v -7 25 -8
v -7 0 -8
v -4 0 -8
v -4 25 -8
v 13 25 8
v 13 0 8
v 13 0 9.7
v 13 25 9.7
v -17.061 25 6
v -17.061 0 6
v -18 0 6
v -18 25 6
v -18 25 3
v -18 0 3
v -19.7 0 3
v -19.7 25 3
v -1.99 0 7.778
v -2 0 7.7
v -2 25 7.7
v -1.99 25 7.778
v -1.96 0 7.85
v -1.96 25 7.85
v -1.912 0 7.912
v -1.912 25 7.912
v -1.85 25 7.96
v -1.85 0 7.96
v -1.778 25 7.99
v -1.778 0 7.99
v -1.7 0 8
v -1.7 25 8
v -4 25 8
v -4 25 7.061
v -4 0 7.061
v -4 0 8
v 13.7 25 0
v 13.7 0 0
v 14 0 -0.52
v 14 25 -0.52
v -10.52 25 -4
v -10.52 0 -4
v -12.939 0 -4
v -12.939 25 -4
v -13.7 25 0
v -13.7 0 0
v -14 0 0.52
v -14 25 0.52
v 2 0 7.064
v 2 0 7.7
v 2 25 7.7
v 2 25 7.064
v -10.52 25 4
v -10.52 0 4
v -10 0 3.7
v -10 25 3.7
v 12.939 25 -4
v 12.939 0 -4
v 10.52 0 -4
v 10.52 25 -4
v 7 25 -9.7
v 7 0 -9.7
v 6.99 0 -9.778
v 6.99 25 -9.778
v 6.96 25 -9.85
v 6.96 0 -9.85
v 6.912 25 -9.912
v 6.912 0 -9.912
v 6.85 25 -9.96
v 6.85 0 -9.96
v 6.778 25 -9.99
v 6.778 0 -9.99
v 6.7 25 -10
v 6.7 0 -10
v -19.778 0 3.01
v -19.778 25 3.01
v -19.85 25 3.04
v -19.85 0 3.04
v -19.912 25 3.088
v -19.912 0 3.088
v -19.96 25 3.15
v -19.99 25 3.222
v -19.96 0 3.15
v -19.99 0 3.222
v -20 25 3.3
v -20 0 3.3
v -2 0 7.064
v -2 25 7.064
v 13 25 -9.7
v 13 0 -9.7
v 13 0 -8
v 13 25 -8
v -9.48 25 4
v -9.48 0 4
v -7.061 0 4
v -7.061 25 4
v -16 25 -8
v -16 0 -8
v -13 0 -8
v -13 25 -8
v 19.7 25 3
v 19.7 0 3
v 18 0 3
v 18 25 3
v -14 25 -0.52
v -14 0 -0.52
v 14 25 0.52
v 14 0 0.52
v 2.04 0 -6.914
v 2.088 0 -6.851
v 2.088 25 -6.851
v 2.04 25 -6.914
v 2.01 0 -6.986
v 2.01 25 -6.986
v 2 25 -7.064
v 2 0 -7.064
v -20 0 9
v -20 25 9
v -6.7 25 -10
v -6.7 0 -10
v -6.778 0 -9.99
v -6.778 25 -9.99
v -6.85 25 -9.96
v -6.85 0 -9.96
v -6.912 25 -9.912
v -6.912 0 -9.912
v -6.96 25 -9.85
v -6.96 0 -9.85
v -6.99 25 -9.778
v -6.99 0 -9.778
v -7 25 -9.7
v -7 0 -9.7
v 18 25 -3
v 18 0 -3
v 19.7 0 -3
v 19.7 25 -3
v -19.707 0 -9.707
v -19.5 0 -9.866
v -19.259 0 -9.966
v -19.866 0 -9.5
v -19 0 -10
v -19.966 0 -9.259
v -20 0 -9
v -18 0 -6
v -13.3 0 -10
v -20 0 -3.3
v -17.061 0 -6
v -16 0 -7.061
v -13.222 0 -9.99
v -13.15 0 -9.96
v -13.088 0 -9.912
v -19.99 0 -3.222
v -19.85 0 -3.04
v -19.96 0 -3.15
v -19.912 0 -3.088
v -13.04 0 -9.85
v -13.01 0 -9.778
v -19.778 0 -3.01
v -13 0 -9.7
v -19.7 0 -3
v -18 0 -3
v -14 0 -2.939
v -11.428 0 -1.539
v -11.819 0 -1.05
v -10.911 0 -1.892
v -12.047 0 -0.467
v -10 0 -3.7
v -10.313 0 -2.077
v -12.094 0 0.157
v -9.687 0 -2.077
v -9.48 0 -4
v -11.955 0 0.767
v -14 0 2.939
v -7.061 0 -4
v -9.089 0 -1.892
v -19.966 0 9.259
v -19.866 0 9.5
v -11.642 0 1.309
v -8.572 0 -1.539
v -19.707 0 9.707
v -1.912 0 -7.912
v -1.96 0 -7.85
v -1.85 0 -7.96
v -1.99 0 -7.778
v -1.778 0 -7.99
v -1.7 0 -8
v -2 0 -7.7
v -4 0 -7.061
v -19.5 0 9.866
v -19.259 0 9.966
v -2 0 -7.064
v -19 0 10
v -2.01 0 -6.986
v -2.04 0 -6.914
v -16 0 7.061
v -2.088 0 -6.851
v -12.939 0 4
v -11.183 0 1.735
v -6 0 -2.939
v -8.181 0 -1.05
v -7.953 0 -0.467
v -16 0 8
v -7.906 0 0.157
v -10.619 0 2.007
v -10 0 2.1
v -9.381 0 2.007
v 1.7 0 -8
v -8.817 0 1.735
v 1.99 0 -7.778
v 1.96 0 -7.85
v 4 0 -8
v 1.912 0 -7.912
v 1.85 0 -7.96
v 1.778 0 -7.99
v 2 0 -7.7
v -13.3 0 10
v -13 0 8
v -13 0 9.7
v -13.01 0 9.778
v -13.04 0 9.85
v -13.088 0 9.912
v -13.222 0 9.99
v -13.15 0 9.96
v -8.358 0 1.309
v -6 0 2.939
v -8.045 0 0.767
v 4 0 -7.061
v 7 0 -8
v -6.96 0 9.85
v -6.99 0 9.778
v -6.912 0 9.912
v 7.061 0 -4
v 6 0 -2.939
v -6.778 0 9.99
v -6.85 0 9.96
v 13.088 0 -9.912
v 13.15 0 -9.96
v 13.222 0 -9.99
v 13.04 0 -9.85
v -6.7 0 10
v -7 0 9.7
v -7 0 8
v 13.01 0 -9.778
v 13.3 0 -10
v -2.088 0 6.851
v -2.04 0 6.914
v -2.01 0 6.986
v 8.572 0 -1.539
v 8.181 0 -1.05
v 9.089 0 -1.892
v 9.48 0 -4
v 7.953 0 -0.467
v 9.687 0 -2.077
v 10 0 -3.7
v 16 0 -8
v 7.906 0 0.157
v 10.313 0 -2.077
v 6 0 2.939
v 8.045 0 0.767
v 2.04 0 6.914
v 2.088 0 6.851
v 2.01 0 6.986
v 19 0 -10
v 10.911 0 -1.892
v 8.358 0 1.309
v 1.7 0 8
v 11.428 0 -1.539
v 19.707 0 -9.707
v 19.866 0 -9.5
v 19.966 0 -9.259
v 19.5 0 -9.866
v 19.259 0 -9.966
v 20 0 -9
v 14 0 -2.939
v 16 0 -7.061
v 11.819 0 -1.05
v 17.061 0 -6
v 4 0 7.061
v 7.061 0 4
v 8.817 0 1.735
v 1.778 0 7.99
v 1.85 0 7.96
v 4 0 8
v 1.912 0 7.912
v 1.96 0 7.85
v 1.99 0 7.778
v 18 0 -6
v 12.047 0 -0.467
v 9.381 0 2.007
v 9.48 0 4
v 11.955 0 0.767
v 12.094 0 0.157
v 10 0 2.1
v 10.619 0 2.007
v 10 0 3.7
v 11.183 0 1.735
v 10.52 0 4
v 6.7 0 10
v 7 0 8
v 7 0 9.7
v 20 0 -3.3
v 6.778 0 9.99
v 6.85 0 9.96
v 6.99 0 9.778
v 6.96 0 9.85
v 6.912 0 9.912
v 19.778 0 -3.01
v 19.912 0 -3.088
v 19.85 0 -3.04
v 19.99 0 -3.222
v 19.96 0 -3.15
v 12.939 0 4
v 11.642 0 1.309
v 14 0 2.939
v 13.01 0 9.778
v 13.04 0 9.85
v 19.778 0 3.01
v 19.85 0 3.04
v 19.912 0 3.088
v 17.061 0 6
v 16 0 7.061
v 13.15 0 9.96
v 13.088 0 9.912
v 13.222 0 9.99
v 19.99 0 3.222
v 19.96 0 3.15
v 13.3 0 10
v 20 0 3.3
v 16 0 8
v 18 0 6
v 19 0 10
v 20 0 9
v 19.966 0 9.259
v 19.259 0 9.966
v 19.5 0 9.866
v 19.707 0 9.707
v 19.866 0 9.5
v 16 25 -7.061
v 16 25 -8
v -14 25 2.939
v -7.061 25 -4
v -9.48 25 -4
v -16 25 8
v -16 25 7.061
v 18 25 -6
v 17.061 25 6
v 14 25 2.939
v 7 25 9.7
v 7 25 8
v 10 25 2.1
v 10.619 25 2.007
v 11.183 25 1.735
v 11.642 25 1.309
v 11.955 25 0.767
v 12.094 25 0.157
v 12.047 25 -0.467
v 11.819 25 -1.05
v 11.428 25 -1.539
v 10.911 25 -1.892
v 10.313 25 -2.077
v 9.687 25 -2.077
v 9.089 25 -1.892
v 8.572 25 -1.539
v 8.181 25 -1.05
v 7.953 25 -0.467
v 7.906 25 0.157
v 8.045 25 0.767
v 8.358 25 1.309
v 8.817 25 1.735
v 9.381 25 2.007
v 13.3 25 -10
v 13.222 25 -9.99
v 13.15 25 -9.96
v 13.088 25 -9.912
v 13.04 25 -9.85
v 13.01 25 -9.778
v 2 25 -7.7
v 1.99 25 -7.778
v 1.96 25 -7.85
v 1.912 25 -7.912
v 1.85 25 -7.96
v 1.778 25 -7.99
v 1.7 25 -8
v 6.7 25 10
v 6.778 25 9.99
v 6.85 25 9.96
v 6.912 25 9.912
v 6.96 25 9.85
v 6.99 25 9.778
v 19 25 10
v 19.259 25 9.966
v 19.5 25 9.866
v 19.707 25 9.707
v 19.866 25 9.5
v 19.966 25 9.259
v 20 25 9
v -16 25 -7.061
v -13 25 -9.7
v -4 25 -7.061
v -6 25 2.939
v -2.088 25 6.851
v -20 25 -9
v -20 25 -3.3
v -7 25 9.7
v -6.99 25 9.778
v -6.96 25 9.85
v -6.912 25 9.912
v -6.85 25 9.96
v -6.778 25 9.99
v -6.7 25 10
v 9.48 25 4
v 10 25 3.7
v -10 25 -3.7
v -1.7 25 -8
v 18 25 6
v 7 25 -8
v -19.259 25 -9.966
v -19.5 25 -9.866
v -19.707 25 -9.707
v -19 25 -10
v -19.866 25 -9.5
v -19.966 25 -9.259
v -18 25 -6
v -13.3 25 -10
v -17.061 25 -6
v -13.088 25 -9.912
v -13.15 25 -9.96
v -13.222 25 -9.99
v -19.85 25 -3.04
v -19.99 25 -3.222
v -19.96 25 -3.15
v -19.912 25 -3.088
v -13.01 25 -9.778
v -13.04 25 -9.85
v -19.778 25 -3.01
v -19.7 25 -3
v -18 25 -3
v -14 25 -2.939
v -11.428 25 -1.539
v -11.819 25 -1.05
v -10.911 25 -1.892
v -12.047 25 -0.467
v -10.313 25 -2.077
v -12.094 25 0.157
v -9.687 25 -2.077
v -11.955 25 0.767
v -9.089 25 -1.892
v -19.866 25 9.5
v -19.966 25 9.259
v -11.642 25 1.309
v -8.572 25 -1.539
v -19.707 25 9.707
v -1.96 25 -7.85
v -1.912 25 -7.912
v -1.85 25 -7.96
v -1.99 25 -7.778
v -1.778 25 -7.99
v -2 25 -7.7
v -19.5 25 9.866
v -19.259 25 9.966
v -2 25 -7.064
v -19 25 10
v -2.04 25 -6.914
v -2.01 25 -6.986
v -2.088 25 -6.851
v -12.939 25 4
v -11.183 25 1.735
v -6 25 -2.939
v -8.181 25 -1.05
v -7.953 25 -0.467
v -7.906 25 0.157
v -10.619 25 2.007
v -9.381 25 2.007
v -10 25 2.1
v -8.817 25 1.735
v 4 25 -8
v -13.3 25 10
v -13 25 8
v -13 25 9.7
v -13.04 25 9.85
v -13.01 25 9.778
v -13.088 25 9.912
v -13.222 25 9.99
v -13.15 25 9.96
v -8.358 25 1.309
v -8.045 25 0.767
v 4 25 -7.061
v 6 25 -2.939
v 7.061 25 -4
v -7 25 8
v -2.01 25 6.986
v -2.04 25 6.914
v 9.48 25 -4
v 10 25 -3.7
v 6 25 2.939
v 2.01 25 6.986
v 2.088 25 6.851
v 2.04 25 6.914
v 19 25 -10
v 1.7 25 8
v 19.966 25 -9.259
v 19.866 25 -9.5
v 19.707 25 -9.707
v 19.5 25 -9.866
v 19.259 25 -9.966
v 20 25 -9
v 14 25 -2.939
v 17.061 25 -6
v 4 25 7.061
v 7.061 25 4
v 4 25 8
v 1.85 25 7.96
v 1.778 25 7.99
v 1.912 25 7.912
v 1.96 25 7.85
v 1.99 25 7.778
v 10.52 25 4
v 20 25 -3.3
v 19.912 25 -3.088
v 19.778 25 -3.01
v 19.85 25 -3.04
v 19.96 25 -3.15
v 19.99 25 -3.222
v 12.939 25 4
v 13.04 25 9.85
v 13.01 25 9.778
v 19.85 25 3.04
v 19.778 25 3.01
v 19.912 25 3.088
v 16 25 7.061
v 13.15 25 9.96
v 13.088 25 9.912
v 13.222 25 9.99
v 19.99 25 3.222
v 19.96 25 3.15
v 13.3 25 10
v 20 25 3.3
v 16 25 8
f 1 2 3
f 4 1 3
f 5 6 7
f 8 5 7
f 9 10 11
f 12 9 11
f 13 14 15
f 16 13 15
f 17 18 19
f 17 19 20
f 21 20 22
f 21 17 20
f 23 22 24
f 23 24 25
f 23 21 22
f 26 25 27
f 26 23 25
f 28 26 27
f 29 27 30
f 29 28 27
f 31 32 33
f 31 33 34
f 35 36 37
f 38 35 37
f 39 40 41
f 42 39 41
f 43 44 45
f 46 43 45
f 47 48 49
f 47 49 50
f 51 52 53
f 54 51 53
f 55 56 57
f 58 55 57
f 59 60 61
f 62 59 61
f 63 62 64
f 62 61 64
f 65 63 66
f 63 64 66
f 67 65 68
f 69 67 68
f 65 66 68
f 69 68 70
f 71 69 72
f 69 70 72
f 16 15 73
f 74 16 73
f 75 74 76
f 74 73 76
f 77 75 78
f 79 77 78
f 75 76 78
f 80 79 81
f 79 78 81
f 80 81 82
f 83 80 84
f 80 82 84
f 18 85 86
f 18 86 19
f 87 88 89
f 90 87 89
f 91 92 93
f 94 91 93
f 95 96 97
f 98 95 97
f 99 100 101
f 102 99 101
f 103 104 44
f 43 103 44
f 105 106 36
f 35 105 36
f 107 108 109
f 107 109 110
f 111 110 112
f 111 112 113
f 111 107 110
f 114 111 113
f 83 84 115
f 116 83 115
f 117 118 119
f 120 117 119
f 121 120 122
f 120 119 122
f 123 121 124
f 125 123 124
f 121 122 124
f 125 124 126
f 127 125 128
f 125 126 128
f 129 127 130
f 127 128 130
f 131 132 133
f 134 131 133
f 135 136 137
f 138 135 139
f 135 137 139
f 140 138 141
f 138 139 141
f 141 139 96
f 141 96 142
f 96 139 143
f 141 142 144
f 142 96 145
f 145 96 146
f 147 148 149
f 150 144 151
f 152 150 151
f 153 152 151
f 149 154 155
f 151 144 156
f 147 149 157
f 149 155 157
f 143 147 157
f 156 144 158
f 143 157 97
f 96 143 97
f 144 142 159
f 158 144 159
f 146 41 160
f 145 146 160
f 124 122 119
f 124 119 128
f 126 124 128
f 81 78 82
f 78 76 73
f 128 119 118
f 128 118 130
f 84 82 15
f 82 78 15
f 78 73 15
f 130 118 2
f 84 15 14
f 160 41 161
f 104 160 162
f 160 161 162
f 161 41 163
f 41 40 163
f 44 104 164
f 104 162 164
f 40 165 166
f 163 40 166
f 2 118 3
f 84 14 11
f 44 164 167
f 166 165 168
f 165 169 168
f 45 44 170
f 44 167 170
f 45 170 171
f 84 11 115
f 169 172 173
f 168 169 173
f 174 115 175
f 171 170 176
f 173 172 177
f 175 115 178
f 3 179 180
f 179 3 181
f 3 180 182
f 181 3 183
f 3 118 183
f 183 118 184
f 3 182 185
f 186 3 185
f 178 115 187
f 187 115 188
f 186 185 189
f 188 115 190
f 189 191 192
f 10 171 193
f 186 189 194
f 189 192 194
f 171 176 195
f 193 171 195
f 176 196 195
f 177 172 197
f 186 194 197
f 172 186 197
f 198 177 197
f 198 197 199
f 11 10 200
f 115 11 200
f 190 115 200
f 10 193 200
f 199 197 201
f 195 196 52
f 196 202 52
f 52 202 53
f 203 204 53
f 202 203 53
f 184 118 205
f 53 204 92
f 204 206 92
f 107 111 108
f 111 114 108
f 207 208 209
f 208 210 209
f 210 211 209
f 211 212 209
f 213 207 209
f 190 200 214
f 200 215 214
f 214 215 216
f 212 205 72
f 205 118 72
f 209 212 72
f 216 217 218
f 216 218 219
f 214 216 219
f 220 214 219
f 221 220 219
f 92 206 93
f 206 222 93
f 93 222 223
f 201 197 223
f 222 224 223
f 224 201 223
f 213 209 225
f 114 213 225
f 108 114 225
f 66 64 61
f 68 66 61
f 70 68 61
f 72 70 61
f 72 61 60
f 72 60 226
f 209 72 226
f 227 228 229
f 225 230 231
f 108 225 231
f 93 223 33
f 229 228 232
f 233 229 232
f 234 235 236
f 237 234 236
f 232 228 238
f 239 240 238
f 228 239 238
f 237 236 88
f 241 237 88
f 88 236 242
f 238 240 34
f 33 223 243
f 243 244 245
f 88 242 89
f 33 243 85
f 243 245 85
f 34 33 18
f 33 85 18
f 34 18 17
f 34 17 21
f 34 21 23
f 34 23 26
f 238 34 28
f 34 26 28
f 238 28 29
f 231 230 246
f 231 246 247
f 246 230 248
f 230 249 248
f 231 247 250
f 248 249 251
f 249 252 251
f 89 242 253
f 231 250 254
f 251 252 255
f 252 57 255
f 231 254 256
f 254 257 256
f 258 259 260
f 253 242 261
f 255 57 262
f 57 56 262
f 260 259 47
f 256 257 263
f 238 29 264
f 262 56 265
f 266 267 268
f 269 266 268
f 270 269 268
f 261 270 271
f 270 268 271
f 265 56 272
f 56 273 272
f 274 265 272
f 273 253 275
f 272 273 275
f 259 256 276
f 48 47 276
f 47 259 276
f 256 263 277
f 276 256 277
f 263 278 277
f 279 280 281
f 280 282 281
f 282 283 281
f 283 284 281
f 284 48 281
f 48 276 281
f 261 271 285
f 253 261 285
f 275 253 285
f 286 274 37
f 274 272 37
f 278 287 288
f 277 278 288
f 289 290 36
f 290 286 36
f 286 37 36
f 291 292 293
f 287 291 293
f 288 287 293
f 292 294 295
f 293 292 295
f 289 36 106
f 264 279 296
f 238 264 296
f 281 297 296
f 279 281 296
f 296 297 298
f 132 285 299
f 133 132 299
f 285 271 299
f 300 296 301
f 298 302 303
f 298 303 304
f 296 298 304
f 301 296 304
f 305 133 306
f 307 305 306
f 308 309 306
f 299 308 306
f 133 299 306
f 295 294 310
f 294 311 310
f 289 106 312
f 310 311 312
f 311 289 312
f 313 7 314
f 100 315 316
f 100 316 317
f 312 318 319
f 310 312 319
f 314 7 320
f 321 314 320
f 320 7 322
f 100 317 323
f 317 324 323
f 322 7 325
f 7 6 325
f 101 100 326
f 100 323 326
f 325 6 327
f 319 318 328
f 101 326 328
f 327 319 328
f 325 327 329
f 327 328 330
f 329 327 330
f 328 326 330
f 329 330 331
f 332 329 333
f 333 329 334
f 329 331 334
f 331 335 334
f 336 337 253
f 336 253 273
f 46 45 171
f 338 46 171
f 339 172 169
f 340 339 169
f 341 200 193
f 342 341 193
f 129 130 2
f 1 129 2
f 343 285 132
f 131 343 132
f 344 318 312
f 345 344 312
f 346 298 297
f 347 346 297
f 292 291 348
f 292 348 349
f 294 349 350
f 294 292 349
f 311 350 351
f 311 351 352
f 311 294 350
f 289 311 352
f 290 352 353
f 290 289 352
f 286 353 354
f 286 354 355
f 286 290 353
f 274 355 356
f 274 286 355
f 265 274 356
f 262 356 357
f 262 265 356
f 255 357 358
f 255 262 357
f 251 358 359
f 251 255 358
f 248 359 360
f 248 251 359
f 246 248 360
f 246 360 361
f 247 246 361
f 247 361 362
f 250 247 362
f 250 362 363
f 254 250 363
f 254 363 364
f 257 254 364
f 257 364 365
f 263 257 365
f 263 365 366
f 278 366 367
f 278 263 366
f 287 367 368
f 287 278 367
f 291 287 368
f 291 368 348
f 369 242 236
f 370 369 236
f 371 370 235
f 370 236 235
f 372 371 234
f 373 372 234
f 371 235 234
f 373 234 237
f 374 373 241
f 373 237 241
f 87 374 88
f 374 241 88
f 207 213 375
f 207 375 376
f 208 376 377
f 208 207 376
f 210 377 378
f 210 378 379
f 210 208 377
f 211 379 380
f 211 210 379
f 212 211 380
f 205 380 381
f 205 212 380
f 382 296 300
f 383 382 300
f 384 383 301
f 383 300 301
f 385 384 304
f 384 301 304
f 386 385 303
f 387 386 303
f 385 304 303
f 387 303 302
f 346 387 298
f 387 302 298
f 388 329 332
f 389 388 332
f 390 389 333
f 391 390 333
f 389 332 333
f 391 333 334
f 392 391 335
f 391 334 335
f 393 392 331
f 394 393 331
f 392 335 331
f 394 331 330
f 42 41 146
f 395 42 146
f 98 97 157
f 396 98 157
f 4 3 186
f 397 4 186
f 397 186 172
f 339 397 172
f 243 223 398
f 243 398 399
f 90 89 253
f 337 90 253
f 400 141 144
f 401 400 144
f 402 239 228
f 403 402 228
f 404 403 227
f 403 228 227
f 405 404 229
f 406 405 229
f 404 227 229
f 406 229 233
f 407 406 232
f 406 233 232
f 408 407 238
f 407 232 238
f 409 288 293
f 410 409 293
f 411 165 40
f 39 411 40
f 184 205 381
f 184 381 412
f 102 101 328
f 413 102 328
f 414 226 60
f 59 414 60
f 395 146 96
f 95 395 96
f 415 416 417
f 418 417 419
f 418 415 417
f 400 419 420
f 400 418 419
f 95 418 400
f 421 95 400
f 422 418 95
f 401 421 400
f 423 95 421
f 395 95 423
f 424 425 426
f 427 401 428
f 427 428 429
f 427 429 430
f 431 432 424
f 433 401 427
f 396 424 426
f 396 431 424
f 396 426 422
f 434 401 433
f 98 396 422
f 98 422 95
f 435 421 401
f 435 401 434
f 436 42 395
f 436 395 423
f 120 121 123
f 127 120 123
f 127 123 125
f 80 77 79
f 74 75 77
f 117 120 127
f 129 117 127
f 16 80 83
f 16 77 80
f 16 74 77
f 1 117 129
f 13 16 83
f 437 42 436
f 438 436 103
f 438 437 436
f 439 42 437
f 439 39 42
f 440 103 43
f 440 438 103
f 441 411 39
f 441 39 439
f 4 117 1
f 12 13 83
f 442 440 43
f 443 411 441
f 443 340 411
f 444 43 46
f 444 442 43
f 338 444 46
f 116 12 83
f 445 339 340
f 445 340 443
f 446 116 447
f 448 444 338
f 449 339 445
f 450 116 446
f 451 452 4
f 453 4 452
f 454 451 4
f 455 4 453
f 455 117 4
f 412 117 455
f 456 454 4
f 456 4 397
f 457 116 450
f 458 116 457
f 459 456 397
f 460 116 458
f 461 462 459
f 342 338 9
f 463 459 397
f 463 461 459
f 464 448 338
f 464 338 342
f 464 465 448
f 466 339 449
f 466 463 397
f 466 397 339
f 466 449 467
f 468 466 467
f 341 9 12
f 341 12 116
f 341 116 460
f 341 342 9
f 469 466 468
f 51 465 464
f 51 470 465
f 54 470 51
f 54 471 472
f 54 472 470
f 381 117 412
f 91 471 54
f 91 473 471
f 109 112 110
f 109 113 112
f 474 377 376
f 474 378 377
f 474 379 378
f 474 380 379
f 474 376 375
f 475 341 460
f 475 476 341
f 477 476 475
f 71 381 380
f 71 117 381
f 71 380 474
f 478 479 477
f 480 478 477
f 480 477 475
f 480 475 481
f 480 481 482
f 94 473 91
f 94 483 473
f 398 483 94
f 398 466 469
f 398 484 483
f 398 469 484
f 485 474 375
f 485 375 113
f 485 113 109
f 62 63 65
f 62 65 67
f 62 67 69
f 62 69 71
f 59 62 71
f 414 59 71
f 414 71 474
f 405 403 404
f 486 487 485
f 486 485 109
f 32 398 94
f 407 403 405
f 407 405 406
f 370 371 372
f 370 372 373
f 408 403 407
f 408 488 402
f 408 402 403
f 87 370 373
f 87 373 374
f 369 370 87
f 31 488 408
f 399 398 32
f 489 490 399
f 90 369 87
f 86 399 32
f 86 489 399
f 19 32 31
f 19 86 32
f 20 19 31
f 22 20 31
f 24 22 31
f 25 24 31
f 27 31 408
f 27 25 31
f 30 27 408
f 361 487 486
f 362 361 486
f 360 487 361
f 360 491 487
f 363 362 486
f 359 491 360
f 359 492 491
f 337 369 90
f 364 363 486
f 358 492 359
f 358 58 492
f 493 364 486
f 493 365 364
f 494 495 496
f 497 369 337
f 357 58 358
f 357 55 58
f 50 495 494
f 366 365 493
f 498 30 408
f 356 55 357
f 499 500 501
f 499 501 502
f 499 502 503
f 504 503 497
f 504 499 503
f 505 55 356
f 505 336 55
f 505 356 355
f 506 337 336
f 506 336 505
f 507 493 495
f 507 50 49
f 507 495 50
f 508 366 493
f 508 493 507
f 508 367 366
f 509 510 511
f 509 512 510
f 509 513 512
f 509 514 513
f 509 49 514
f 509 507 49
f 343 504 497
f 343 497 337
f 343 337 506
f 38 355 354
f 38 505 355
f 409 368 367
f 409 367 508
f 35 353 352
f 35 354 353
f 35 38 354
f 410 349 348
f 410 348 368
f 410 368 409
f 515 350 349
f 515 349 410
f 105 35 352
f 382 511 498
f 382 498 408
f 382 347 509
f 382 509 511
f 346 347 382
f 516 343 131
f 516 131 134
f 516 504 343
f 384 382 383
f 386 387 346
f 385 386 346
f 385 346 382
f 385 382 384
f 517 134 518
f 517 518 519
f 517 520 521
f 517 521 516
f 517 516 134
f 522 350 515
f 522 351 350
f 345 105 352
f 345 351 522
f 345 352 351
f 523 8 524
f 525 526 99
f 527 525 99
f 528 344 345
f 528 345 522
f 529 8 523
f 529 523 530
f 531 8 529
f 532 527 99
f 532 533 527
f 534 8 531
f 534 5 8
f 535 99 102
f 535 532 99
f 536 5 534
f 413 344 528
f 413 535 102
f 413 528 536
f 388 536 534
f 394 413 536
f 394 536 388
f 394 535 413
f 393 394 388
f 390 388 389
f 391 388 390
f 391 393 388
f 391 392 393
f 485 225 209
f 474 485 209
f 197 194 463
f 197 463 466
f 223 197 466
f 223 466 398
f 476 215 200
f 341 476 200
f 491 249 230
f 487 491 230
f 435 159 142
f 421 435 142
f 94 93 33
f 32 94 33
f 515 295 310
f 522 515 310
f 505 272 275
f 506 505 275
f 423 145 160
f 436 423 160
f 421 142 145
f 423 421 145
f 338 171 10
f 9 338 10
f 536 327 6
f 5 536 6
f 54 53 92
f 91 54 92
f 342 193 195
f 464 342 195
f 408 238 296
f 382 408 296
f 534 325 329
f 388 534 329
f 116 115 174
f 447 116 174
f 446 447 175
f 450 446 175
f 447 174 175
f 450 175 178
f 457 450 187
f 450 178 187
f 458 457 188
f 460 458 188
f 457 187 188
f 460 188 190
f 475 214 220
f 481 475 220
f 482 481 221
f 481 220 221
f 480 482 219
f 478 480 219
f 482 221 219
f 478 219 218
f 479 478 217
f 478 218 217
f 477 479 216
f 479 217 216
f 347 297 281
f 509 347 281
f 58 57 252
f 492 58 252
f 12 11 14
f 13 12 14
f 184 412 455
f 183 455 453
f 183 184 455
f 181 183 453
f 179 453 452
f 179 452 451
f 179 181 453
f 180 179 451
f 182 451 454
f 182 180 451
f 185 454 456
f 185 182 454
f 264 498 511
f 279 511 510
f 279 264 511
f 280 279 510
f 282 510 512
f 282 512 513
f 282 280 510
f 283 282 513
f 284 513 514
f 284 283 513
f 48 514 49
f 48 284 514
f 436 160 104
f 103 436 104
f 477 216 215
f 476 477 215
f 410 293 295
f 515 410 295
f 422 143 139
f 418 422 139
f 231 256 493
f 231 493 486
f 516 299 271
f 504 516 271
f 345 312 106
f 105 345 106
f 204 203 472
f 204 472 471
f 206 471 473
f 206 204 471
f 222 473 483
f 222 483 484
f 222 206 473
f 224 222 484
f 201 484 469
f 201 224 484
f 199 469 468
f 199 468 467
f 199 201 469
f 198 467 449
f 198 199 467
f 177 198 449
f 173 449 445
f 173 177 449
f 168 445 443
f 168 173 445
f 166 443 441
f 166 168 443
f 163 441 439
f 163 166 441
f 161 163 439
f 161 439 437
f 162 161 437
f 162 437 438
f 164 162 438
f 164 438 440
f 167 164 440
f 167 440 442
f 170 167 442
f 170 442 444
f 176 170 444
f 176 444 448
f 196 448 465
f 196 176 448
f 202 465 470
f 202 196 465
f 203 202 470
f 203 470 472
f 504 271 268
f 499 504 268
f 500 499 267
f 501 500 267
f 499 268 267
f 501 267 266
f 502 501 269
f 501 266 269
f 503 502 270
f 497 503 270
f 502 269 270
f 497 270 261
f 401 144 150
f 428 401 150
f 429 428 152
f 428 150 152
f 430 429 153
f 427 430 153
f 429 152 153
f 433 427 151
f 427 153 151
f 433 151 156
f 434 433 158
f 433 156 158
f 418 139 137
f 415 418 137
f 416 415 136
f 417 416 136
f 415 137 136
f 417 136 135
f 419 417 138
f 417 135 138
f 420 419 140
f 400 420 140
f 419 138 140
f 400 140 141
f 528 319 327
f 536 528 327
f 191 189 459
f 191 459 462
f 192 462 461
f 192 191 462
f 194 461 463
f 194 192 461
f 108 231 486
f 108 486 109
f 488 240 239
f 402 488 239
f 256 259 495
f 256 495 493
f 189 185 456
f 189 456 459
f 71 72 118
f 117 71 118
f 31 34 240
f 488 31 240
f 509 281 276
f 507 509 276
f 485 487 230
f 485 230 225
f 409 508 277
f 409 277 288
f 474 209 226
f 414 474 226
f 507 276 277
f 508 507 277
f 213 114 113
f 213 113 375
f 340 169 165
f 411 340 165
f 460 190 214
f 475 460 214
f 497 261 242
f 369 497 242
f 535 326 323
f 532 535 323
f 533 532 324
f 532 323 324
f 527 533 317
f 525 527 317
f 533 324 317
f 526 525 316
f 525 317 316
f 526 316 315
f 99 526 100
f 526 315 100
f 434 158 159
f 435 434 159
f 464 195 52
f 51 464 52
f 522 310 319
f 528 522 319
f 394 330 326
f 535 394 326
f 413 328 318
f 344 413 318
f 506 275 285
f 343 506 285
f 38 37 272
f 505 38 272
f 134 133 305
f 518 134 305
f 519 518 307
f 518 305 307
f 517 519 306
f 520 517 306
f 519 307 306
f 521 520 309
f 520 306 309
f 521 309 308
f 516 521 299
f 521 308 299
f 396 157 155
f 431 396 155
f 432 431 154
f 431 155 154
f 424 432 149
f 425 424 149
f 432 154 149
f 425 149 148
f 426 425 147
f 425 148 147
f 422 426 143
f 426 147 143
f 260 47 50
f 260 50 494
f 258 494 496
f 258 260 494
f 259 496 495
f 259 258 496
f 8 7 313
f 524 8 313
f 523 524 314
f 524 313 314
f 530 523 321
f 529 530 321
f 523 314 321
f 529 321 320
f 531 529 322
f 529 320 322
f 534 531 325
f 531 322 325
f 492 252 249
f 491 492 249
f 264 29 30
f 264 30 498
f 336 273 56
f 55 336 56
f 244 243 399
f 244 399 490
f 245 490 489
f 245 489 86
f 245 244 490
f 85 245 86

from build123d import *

# Parameters (mm, degrees)
MODEL_R                  = 2.0999999
STRUCTURAL_MEMBER1_DEPTH = 25


with BuildPart() as part:
    # Model → Structural Member1 (new body)
    with BuildSketch(Plane.ZX):
        with BuildLine():
            Line((-10, -13.3000005), (-10, -19))
            ThreePointArc((-10, -19), (-9.707106781, -19.707106781), (-9, -20))
            Line((-9, -20), (-3.3, -20))
            ThreePointArc((-3.3, -20), (-3.087867966, -19.912132034), (-3, -19.7))
            Line((-3, -19.7), (-3, -18))
            Line((-3, -18), (-6, -18))
            Line((-6, -18), (-6, -17.0606825))
            Line((-6, -17.0606825), (-2.939318, -14))
            Line((-2.939318, -14), (-0.519615242, -14))
            Line((-0.519615242, -14), (0, -13.7))
            Line((0, -13.7), (0.519615242, -14))
            Line((0.519615242, -14), (2.9393365, -14))
            Line((2.9393365, -14), (6, -17.0606628))
            Line((6, -17.0606628), (6, -18))
            Line((6, -18), (3, -18))
            Line((3, -18), (3, -19.7))
            ThreePointArc((3, -19.7), (3.087867966, -19.912132034), (3.3, -20))
            Line((3.3, -20), (9, -20))
            ThreePointArc((9, -20), (9.707106781, -19.707106781), (10, -19))
            Line((10, -19), (10, -13.3000005))
            ThreePointArc((10, -13.3000005), (9.912132034, -13.087868466), (9.7, -13.0000005))
            Line((9.7, -13.0000005), (8, -13.0000005))
            Line((8, -13.0000005), (8, -16.0000005))
            Line((8, -16.0000005), (7.06065685, -16.0000005))
            Line((7.06065685, -16.0000005), (4, -12.93934215))
            Line((4, -12.93934215), (4, -10.519615742))
            Line((4, -10.519615742), (3.7, -10.0000005))
            Line((3.7, -10.0000005), (4, -9.480385258))
            Line((4, -9.480385258), (4, -7.06068365))
            Line((4, -7.06068365), (7.06068236, -4.000000504))
            Line((7.06068236, -4.000000504), (8, -4.000000504))
            Line((8, -4.000000504), (8, -7.0000005))
            Line((8, -7.0000005), (9.7, -7.0000005))
            ThreePointArc((9.7, -7.0000005), (9.912132034, -6.912132534), (10, -6.7000005))
            Line((10, -6.7000005), (10, 6.7))
            ThreePointArc((10, 6.7), (9.912132034, 6.912132034), (9.7, 7))
            Line((9.7, 7), (8, 7))
            Line((8, 7), (8, 4))
            Line((8, 4), (7.060678, 4))
            Line((7.060678, 4), (4, 7.06068075))
            Line((4, 7.06068075), (4, 9.480384758))
            Line((4, 9.480384758), (3.7, 10))
            Line((3.7, 10), (4, 10.519615242))
            Line((4, 10.519615242), (4, 12.93933675))
            Line((4, 12.93933675), (7.060661, 16))
            Line((7.060661, 16), (8, 16))
            Line((8, 16), (8, 13))
            Line((8, 13), (9.7, 13))
            ThreePointArc((9.7, 13), (9.912132034, 13.087867966), (10, 13.3))
            Line((10, 13.3), (10, 19))
            ThreePointArc((10, 19), (9.707106781, 19.707106781), (9, 20))
            Line((9, 20), (3.3, 20))
            ThreePointArc((3.3, 20), (3.087867966, 19.912132034), (3, 19.7))
            Line((3, 19.7), (3, 18))
            Line((3, 18), (6, 18))
            Line((6, 18), (6, 17.06065975))
            Line((6, 17.06065975), (2.939354, 14))
            Line((2.939354, 14), (0.519638625, 14))
            Line((0.519638625, 14), (0, 13.6999865))
            Line((0, 13.6999865), (-0.519638625, 14))
            Line((-0.519638625, 14), (-2.939335, 14))
            Line((-2.939335, 14), (-6, 17.060678))
            Line((-6, 17.060678), (-6, 18))
            Line((-6, 18), (-3, 18))
            Line((-3, 18), (-3, 19.7))
            ThreePointArc((-3, 19.7), (-3.087867966, 19.912132034), (-3.3, 20))
            Line((-3.3, 20), (-9, 20))
            ThreePointArc((-9, 20), (-9.707106781, 19.707106781), (-10, 19))
            Line((-10, 19), (-10, 13.3))
            ThreePointArc((-10, 13.3), (-9.912132034, 13.087867966), (-9.7, 13))
            Line((-9.7, 13), (-8, 13))
            Line((-8, 13), (-8, 16))
            Line((-8, 16), (-7.060642, 16))
            Line((-7.060642, 16), (-4, 12.9393565))
            Line((-4, 12.9393565), (-4, 10.519615242))
            Line((-4, 10.519615242), (-3.7, 10))
            Line((-3.7, 10), (-4, 9.480384758))
            Line((-4, 9.480384758), (-4, 7.06066))
            Line((-4, 7.06066), (-7.060659, 4))
            Line((-7.060659, 4), (-8, 4))
            Line((-8, 4), (-8, 7))
            Line((-8, 7), (-9.7, 7))
            ThreePointArc((-9.7, 7), (-9.912132034, 6.912132034), (-10, 6.7))
            Line((-10, 6.7), (-10, -6.7000005))
            ThreePointArc((-10, -6.7000005), (-9.912132034, -6.912132534), (-9.7, -7.0000005))
            Line((-9.7, -7.0000005), (-8, -7.0000005))
            Line((-8, -7.0000005), (-8, -4.0000005))
            Line((-8, -4.0000005), (-7.06066257, -4.0000005))
            Line((-7.06066257, -4.0000005), (-4, -7.0606688))
            Line((-4, -7.0606688), (-4, -9.480385258))
            Line((-4, -9.480385258), (-3.7, -10.0000005))
            Line((-3.7, -10.0000005), (-4, -10.519615742))
            Line((-4, -10.519615742), (-4, -12.9393575))
            Line((-4, -12.9393575), (-7.0606365, -16.0000005))
            Line((-7.0606365, -16.0000005), (-8, -16.0000005))
            Line((-8, -16.0000005), (-8, -13.0000005))
            Line((-8, -13.0000005), (-9.7, -13.0000005))
            ThreePointArc((-9.7, -13.0000005), (-9.912132034, -13.087868466), (-10, -13.3000005))
        make_face()
        with Locations((0, 10)):
            Circle(MODEL_R, mode=Mode.SUBTRACT)
        with Locations((0, -10.0000005)):
            Circle(MODEL_R, mode=Mode.SUBTRACT)
        with BuildLine():
            Line((-8, 1.6999995), (-8, -1.70000025))
            ThreePointArc((-8, -1.70000025), (-7.912132034, -1.912132284), (-7.7, -2.00000025))
            Line((-7.7, -2.00000025), (-7.063604538, -2.00000025))
            ThreePointArc((-7.063604538, -2.00000025), (-6.948800316, -2.022823986), (-6.851481305, -2.087861995))
            Line((-6.851481305, -2.087861995), (-2.939335, -6))
            Line((-2.939335, -6), (2.93933195, -6))
            Line((2.93933195, -6), (6.851479294, -2.087861656))
            ThreePointArc((6.851479294, -2.087861656), (6.948799922, -2.022824212), (7.06360515, -2.00000025))
            Line((7.06360515, -2.00000025), (7.7, -2.00000025))
            ThreePointArc((7.7, -2.00000025), (7.912132034, -1.912132284), (8, -1.70000025))
            Line((8, -1.70000025), (8, 1.6999995))
            ThreePointArc((8, 1.6999995), (7.912132034, 1.912131534), (7.7, 1.9999995))
            Line((7.7, 1.9999995), (7.06359945, 1.9999995))
            ThreePointArc((7.06359945, 1.9999995), (6.9487942, 2.022823721), (6.851474147, 2.087862153))
            Line((6.851474147, 2.087862153), (2.9393355, 6))
            Line((2.9393355, 6), (-2.939339, 6))
            Line((-2.939339, 6), (-6.851476944, 2.087862556))
            ThreePointArc((-6.851476944, 2.087862556), (-6.948795311, 2.022823488), (-7.063599538, 1.9999995))
            Line((-7.063599538, 1.9999995), (-7.7, 1.9999995))
            ThreePointArc((-7.7, 1.9999995), (-7.912132034, 1.912131534), (-8, 1.6999995))
        make_face(mode=Mode.SUBTRACT)
    extrude(amount=STRUCTURAL_MEMBER1_DEPTH)


solid = part.part
